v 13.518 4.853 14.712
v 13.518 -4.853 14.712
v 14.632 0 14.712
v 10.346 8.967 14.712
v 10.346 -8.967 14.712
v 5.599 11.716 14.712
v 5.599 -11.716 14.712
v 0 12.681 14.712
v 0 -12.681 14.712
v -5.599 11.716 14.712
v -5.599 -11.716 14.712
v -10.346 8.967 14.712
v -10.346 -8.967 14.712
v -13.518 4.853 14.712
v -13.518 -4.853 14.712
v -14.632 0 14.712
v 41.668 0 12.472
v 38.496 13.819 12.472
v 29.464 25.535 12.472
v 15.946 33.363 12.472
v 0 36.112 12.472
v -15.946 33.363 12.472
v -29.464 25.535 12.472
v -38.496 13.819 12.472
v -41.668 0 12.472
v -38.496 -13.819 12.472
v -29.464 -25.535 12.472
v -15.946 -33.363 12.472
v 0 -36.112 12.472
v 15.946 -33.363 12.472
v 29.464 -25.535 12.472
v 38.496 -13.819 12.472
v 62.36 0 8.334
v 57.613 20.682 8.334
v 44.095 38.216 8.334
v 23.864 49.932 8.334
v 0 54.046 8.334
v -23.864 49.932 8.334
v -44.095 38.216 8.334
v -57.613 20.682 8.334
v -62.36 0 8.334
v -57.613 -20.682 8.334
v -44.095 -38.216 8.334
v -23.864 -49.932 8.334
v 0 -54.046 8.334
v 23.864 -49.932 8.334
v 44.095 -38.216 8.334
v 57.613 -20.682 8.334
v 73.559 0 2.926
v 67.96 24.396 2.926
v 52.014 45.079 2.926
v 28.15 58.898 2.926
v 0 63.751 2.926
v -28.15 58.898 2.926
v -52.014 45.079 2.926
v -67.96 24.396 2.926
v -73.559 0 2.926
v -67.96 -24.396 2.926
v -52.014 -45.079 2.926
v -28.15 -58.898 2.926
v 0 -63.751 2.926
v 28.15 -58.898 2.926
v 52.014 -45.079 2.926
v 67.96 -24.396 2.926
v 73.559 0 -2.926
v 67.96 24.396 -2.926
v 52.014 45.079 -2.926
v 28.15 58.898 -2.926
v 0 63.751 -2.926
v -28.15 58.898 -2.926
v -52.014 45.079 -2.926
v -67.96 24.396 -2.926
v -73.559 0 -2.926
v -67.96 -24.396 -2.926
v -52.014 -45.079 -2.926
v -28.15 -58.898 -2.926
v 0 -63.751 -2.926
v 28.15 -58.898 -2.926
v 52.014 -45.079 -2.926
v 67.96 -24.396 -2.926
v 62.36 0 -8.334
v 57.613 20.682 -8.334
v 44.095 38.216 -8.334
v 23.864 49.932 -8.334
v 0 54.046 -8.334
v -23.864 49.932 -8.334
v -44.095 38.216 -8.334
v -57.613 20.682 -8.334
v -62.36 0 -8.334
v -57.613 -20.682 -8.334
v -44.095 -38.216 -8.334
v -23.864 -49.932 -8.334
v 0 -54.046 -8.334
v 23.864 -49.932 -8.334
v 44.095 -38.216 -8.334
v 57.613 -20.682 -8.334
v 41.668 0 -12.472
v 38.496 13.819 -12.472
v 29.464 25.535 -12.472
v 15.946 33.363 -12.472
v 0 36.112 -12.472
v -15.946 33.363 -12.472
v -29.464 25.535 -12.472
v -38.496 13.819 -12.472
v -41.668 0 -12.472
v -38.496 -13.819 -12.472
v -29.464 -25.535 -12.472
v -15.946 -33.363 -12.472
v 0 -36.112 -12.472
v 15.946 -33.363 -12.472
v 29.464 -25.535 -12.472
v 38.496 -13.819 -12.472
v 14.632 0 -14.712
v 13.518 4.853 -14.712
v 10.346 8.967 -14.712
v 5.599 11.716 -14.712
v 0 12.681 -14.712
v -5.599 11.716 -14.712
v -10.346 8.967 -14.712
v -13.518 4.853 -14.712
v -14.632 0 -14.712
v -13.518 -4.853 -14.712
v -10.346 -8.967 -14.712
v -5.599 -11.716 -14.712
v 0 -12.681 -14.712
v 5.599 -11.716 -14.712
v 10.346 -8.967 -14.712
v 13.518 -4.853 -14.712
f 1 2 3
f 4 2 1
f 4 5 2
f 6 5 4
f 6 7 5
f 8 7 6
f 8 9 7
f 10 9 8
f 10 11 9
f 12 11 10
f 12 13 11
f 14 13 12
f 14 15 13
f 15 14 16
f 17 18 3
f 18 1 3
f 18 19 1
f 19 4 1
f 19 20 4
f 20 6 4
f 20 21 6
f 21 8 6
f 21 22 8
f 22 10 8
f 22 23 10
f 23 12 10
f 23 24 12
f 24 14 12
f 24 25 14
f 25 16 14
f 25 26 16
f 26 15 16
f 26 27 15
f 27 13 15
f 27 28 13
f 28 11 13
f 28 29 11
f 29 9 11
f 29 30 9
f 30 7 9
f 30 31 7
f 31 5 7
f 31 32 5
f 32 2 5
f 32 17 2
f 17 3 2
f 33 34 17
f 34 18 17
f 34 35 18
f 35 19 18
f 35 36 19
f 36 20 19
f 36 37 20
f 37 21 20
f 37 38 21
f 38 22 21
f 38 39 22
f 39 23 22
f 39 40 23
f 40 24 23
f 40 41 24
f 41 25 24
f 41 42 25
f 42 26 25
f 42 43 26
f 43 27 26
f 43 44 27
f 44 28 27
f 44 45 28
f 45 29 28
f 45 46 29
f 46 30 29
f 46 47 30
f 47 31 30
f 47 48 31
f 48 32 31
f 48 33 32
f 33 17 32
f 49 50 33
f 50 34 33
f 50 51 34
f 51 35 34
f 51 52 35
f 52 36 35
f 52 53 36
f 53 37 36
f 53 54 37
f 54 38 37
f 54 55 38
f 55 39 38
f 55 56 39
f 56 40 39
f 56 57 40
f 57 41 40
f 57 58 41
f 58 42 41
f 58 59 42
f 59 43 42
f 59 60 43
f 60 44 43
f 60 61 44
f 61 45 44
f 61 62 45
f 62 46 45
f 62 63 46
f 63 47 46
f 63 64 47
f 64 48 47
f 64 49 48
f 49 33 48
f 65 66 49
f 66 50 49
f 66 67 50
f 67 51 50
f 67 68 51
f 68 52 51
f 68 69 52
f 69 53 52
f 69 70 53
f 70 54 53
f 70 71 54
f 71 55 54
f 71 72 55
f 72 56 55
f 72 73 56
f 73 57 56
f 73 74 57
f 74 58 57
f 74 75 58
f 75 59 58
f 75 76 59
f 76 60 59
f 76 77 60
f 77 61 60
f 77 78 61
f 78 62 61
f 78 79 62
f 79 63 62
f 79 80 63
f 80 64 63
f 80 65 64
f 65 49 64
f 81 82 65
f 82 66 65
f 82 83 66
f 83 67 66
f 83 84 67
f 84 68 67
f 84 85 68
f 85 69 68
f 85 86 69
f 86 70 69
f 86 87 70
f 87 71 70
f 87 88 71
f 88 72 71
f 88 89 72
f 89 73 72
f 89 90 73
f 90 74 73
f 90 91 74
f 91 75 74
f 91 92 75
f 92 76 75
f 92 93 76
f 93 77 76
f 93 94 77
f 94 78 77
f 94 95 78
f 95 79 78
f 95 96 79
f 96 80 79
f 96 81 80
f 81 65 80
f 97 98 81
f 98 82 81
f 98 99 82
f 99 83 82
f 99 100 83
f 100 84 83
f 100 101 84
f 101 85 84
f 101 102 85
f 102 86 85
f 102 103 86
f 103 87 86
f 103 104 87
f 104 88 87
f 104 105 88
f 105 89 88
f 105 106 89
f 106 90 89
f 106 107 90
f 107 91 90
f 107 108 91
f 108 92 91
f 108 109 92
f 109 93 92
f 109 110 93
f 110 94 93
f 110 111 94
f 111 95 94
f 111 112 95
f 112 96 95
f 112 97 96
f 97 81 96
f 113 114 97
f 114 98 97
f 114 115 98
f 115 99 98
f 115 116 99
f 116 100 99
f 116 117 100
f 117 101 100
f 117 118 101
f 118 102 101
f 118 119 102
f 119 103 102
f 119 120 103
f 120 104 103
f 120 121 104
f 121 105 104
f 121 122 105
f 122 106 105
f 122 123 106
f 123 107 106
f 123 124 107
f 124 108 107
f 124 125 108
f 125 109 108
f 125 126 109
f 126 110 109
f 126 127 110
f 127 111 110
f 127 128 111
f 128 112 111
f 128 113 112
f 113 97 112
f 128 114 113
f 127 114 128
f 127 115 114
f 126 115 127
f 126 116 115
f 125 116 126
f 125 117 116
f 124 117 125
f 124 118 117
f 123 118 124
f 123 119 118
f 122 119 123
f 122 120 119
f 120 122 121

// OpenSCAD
// Generated by SolidPython 1.0.1 on 2020-07-29 00:46:52


scale(v = [15, 13, 3]) {
	sphere(r = 5);
}
/***********************************************
*********      SolidPython code:      **********
************************************************
 
# import packages: SolidPython
from solid import *
from solid.utils import *
from itertools import chain, combinations, permutations


class Resize:

    def __init__(self, scad_file):
        self.scad_file = scad_file
        #self.scad_file = import_scad(scad_file)
        # cone/cylinder param:
        self.r1 = 0
        self.r2 = 0
        self.h = 0
        # rectangular prism param:
        self.w = 0
        self.l = 0
        # ellipse param:
        self.r = 0

    # import OpenScad code (file name corresponds to shape)


    # classify shape + parameters
    def assign(self, param1, param2, param3):
        if self.scad_file == 'cone.scad':
            self.r1 = param1
            self.r2 = param2
            self.h = param3
        elif self.scad_file == 'cylinder.scad':
            self.r1 = param1
            self.r2 = param2
            self.h = param3
        elif self.scad_file == 'rectangularPrism.scad':
            self.h = param1
            self.l = param2
            self.w = param3
        else:
            self.r = param1
            self.h = param2

    # resize parameters
    def iterate(self):
        x = range(3, 20, 2)
        i = 1
        if self.scad_file == 'cone.scad':
            tempList = list(permutations(x, 2))
            for temp in tempList:
                param1 = temp[0]
                param2 = temp[1]
                filepath = 'produced_scad_files/' + 'cone' + str(param1) + '_' + str(param2) + '_' + '.scad'
                scad_render_to_file(cylinder(h=param1, r1=param2, r2=0), filepath)

        elif self.scad_file == 'cylinder.scad':
            tempList = list(permutations(x, 3))
            for temp in tempList:
                param1 = temp[0]
                param2 = temp[1]
                filepath = 'produced_scad_files/' + 'cylinder' + str(param1) + '_' + str(param2) + '_' + '.scad'
                scad_render_to_file(cylinder(h=param1, r1=param2, r2=param2), filepath)

        elif self.scad_file == 'rectangularPrism.scad':
            tempList = list(permutations(x, 3))
            for temp in tempList:
                param1 = temp[0]
                param2 = temp[1]
                param3 = temp[2]
                filepath = 'produced_scad_files/' + 'rectangularPrism' + str(param1) + '_' + str(param2) + '_' + str(
                    param3) + '.scad'
                scad_render_to_file(cube(size=(param1, param2, param3)), filepath)

        elif self.scad_file == 'ellipse.scad':
            tempList = list(permutations(x, 4))
            for temp in tempList:
                param1 = temp[0]
                param2 = temp[1]
                param3 = temp[2]
                param4 = temp[3]
                filepath = 'produced_scad_files/' + 'ellipse' + str(param1) + '_' + str(param2) + '_' + str(param3) + '_' + str(param4) + '.scad'
                scad_render_to_file(scale([param1, param2, param3])(sphere(r=param4)), filepath)

    def render_to_scadfile(self):
        scad_render_to_file(scad, 'example.scad') 
 
************************************************/
